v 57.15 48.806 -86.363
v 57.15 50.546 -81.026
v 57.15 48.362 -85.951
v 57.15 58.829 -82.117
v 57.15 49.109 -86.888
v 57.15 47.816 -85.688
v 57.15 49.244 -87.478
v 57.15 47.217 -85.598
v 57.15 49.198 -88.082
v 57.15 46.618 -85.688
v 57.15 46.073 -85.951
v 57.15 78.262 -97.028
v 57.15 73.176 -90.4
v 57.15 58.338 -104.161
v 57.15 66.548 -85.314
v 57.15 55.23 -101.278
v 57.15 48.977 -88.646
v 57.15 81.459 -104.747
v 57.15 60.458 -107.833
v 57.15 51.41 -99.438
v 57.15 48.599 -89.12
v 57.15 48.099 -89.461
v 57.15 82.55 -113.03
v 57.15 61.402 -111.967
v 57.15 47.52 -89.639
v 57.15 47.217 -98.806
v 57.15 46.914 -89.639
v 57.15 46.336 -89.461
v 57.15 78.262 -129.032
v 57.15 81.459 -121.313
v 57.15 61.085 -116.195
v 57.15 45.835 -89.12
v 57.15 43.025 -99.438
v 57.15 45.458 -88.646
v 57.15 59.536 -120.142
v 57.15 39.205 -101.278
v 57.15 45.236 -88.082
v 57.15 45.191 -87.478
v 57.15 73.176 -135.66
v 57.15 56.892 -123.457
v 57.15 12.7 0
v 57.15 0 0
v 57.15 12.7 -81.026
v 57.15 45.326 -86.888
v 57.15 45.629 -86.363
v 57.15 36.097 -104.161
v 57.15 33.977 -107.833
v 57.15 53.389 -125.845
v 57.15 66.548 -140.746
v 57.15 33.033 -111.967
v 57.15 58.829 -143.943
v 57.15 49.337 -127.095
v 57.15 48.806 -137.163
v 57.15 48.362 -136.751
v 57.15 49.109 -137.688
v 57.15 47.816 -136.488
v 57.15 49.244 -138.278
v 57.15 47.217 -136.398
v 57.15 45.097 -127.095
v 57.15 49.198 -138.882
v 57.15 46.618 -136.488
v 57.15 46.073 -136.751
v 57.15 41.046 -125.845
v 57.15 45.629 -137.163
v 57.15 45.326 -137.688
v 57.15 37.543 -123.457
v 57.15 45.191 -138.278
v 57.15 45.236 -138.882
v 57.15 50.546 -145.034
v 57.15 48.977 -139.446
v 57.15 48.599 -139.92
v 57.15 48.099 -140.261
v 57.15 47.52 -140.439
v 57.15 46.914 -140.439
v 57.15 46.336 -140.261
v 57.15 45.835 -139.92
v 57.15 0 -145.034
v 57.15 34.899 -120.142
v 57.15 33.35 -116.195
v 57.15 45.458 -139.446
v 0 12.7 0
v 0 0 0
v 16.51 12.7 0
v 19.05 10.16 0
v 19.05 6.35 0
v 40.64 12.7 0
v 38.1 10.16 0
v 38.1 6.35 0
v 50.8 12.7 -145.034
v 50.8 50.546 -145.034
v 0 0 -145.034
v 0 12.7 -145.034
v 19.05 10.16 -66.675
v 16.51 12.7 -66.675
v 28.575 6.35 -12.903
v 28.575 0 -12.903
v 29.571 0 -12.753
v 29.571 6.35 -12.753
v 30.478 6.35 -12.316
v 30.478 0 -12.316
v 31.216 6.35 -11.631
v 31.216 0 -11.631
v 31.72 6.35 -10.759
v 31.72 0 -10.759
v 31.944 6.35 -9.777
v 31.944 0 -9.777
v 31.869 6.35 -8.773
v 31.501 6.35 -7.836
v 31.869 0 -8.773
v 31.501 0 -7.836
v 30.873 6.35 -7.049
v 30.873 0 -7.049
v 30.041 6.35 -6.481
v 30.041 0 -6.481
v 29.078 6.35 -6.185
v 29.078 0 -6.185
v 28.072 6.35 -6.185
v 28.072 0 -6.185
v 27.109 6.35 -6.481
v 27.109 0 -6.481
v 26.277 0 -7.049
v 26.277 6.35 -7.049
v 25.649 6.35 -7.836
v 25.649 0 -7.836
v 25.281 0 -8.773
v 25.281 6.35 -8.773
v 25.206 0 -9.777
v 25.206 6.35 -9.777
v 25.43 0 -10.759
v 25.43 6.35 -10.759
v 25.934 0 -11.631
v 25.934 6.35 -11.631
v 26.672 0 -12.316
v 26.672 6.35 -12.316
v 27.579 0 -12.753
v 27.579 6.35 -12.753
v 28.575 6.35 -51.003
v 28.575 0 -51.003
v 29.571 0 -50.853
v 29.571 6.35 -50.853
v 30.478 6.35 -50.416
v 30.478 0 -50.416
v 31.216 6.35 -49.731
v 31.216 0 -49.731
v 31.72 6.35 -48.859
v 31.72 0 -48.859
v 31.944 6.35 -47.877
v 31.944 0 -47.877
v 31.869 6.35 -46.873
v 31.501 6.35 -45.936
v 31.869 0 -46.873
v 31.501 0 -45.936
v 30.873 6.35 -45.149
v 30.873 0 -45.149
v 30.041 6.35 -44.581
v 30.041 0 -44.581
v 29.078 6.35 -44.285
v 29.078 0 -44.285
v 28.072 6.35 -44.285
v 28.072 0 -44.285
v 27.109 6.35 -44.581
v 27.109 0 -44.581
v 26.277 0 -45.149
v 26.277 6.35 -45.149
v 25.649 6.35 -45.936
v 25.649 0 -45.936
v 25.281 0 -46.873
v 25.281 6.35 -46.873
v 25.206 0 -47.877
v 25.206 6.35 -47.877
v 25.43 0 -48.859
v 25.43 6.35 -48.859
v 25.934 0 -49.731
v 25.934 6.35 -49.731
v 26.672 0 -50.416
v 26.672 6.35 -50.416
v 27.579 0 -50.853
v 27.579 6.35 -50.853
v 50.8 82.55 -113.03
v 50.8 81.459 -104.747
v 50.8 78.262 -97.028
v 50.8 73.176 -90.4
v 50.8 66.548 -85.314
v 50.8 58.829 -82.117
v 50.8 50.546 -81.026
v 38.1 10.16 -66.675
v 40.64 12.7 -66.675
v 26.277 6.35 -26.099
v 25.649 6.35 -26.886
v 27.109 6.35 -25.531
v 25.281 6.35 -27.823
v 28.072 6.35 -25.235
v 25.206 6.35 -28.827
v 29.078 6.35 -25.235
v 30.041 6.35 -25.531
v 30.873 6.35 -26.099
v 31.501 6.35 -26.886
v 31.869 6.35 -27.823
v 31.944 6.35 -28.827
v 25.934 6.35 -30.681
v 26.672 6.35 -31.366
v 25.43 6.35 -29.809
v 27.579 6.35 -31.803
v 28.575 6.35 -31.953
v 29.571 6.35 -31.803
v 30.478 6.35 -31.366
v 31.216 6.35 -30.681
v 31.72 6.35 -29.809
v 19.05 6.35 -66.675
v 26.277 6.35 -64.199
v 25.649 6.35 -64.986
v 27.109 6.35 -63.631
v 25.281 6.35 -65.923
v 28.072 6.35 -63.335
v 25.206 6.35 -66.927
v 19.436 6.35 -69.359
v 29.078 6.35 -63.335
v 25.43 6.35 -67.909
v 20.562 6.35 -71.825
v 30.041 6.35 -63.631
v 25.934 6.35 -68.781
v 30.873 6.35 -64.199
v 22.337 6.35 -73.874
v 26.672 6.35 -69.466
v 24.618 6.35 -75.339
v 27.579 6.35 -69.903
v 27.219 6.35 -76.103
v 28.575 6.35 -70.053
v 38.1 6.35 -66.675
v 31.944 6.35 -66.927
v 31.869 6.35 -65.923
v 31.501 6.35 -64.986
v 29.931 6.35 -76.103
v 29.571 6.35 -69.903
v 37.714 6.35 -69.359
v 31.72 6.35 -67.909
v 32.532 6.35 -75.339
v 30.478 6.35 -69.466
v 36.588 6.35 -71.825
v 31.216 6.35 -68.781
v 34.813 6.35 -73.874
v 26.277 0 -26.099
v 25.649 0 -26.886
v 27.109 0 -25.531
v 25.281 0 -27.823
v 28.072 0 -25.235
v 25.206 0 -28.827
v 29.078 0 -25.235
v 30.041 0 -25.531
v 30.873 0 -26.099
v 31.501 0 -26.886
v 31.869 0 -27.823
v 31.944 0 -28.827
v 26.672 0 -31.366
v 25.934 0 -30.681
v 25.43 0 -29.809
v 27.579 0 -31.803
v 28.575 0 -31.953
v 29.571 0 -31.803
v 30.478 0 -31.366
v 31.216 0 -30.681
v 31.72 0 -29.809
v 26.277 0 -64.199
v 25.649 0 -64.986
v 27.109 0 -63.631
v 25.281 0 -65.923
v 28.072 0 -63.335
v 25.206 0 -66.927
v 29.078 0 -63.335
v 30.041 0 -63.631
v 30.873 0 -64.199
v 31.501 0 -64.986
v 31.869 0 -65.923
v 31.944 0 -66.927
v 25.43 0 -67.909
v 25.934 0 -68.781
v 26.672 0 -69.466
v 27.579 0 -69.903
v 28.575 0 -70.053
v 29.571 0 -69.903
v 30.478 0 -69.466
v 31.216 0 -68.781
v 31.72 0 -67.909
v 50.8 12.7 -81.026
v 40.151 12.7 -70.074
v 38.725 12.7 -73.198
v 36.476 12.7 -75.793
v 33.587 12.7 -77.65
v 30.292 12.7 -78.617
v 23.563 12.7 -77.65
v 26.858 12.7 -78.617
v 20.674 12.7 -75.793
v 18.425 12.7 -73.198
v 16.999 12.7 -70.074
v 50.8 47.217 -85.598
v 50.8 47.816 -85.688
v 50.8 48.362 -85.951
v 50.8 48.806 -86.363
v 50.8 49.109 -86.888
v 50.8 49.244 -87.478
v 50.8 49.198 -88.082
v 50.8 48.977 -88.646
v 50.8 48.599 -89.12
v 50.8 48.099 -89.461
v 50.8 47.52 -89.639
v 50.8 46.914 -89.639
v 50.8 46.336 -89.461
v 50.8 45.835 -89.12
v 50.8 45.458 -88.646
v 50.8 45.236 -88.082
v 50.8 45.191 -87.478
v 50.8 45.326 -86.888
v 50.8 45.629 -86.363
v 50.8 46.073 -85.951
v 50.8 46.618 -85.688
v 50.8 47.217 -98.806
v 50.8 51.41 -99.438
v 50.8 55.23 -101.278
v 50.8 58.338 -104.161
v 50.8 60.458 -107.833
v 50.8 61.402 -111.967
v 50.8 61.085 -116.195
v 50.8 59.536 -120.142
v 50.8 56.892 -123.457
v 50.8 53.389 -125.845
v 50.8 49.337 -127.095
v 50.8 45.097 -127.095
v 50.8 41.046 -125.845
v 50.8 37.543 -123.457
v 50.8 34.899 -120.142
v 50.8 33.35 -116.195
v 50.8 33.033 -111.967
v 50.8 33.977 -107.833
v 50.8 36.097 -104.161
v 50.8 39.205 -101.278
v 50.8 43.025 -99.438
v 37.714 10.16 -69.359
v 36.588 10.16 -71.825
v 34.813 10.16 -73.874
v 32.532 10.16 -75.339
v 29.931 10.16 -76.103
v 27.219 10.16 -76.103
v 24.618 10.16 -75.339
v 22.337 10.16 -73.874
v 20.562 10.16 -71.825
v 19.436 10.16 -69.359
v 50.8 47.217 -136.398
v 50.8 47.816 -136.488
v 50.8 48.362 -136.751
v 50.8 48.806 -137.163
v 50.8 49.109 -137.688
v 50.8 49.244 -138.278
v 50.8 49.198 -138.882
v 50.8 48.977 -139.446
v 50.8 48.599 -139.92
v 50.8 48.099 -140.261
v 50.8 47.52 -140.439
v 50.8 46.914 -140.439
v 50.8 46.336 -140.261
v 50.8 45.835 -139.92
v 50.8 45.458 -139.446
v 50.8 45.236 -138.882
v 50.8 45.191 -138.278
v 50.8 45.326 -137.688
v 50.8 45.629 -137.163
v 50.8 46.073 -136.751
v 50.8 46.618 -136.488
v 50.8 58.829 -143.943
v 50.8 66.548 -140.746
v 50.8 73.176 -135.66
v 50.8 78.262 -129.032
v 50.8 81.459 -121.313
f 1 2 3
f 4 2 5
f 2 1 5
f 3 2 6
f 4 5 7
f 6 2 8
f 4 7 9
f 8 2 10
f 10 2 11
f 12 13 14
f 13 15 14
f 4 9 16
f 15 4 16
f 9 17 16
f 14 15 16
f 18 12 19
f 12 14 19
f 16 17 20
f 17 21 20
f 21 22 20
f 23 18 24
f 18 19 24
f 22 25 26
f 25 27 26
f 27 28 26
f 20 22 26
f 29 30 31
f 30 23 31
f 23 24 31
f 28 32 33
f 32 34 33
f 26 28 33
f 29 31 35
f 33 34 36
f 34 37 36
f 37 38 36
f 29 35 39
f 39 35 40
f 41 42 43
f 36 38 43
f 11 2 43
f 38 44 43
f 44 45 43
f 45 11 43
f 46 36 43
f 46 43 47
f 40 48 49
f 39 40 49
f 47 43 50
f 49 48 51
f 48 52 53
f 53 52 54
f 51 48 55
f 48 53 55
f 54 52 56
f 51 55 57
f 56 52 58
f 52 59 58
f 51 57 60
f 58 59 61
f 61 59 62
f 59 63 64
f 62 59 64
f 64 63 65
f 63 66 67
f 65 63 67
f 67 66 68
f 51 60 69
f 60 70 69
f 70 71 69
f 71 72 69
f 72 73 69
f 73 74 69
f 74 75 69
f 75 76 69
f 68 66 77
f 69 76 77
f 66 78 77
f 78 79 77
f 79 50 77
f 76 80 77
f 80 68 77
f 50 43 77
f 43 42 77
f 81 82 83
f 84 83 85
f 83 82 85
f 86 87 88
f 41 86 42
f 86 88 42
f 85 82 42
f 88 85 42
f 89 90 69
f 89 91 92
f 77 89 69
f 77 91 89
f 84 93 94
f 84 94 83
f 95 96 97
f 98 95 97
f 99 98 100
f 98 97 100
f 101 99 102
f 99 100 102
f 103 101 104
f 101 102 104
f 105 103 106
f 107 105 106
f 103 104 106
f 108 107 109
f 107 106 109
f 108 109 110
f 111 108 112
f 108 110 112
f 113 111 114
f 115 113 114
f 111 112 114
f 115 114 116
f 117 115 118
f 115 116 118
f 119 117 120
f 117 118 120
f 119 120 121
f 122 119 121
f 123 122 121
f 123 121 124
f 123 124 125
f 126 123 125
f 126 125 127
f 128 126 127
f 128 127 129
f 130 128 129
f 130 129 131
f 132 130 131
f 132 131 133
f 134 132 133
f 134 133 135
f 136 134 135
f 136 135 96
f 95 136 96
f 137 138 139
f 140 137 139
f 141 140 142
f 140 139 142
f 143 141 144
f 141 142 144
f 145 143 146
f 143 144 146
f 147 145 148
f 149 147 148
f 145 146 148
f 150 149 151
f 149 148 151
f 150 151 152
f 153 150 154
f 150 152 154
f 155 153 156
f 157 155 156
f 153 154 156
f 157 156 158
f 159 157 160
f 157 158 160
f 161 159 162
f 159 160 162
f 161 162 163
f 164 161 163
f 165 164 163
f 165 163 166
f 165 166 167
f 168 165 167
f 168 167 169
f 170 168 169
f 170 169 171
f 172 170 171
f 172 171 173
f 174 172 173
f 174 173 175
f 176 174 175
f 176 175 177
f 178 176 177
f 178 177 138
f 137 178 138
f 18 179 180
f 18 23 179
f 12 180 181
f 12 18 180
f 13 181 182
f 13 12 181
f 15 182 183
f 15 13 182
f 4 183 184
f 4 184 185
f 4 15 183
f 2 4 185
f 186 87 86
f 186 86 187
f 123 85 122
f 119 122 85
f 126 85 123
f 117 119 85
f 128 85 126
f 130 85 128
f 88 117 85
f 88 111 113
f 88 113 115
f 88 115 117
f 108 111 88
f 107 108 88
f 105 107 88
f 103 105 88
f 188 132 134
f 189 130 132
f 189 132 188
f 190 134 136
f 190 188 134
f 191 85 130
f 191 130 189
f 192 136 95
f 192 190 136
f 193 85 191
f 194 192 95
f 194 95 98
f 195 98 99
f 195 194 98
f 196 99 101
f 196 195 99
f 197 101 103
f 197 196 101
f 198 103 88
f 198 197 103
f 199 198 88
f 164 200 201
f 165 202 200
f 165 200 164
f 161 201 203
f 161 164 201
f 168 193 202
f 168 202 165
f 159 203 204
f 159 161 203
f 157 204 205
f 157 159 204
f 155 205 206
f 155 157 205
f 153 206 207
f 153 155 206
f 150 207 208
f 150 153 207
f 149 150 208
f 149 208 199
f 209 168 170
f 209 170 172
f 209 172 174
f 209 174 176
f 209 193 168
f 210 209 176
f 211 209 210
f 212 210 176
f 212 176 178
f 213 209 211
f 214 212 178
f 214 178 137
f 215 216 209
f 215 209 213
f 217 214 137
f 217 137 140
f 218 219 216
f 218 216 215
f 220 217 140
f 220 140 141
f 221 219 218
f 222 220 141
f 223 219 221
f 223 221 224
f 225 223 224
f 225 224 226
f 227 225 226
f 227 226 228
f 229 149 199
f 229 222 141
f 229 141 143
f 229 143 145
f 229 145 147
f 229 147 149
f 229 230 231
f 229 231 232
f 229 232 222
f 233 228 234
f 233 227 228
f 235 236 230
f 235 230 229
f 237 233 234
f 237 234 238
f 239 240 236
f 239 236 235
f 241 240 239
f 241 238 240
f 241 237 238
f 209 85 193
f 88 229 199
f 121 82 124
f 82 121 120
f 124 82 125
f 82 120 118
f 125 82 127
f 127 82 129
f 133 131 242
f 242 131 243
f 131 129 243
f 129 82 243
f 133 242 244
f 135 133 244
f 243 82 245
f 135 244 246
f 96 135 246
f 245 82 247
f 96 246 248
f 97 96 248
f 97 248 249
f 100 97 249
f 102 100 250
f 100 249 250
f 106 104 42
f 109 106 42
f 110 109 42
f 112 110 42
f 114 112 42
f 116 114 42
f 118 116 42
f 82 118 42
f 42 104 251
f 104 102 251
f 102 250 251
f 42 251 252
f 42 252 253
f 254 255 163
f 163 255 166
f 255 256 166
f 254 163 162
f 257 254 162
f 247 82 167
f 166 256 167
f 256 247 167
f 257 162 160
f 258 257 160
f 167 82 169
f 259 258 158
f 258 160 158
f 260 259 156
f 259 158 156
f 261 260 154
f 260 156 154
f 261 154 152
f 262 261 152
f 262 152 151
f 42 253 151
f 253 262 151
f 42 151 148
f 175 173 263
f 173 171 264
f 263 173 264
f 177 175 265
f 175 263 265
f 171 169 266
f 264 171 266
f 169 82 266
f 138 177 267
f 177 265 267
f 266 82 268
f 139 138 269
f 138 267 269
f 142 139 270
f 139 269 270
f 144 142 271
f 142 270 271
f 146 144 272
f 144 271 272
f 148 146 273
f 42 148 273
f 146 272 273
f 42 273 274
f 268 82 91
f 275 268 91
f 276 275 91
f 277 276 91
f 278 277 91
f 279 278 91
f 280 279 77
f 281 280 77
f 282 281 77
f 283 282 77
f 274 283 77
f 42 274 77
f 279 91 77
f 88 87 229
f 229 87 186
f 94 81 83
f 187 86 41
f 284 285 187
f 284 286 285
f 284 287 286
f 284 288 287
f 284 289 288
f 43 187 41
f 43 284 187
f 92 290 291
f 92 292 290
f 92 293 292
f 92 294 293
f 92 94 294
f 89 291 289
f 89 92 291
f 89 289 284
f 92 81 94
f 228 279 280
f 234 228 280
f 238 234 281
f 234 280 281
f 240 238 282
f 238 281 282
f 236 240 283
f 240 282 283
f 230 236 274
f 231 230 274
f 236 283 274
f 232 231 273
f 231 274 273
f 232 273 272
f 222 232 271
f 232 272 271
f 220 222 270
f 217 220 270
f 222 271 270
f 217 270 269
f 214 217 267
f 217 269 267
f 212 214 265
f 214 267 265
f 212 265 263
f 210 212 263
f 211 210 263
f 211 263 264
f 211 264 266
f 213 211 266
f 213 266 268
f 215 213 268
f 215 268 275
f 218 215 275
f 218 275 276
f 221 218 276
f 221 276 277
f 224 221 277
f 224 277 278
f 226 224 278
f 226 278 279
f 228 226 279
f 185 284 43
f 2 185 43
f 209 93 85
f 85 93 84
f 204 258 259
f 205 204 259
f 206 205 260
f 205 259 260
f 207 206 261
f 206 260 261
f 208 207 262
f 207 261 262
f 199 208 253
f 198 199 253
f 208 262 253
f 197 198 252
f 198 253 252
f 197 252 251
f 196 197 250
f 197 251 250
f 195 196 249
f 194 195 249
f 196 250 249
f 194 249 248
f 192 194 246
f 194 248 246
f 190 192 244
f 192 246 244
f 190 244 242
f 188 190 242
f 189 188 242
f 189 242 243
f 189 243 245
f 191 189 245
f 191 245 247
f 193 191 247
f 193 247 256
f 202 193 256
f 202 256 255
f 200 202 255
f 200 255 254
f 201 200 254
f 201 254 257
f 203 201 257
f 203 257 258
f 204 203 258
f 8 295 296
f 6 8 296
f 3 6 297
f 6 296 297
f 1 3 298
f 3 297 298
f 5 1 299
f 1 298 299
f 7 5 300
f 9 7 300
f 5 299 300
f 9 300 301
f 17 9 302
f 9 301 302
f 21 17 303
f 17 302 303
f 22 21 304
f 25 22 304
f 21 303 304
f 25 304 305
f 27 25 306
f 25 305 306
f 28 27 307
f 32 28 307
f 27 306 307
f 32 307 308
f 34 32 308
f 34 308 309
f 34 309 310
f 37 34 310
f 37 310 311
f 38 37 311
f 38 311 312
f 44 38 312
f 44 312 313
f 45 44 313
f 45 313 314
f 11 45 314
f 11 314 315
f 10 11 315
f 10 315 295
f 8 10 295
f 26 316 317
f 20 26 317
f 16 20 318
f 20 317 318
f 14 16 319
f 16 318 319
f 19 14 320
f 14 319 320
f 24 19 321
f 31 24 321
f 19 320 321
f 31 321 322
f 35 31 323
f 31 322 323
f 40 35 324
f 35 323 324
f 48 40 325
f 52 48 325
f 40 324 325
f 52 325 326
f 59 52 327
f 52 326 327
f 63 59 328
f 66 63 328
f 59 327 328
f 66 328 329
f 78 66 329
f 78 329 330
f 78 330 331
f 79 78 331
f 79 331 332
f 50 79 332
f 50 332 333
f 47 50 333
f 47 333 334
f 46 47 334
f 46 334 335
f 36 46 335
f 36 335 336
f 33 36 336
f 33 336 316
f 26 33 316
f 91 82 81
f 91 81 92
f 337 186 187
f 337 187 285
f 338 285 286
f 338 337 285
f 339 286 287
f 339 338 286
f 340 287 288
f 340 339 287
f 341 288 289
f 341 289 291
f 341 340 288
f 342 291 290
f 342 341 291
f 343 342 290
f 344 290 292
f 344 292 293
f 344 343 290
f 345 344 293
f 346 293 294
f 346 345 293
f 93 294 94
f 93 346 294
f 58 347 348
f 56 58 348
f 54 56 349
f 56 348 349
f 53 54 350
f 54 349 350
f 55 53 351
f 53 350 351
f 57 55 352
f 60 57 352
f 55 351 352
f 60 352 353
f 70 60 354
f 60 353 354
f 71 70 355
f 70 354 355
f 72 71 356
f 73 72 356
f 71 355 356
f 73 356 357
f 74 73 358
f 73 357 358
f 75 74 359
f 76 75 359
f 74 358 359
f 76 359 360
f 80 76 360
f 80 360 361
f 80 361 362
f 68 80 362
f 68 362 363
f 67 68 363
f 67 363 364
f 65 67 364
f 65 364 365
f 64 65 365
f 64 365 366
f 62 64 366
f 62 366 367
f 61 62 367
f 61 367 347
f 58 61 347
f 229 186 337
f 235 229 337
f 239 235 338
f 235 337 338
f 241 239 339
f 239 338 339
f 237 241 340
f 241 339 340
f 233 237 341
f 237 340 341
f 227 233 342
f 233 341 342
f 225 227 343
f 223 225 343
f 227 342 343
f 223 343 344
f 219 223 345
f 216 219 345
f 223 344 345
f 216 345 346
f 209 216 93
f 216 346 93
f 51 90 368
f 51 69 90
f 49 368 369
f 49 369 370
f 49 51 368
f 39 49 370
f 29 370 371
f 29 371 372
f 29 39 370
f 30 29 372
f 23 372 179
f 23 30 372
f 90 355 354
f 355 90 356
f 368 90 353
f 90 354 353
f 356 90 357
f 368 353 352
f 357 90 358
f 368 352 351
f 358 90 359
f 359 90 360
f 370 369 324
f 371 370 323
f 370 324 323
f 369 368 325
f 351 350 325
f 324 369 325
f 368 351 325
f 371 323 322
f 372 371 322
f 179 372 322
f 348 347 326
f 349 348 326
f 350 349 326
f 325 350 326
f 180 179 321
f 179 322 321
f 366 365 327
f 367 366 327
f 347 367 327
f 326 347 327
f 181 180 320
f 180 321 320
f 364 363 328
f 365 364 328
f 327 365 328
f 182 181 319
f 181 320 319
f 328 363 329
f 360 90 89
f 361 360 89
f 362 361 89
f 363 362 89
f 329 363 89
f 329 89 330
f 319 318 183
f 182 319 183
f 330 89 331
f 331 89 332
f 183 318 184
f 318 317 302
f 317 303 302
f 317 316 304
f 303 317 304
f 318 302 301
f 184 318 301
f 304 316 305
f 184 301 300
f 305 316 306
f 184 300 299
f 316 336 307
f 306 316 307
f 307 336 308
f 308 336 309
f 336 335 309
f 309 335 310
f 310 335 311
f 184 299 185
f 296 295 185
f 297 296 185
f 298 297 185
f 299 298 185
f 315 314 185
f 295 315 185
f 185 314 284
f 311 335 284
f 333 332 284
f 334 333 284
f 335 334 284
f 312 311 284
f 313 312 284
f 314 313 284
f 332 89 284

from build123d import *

# Parameters (mm, degrees)
SKETCH1_W           = 57.15
SKETCH1_H           = 145.034
BOSS_EXTRUDE1_DEPTH = 12.7
SKETCH4_R           = 3.3782
CUT_EXTRUDE3_DEPTH  = 157.404199611
CUT_EXTRUDE4_DEPTH  = 6.35
CHAMFER1_SIZE       = 2.54
SKETCH7_W           = 6.35
SKETCH7_H           = 64.008
BOSS_EXTRUDE2_DEPTH = 82.55
SKETCH9_R           = 14.224
SKETCH9_R_2         = 2.032
CUT_EXTRUDE5_DEPTH  = 82.55
FILLET1_R           = 32.004


with BuildPart() as part:
    # Sketch1 → Boss-Extrude1 (new body)
    with BuildSketch(Plane(origin=(0, 0, 0), x_dir=(1, 0, 0), z_dir=(0, 1, 0))):
        with Locations((28.575, 72.517)):
            Rectangle(SKETCH1_W, SKETCH1_H)
    extrude(amount=BOSS_EXTRUDE1_DEPTH)

    # Sketch4 → Cut-Extrude3 (cut, through all)
    with BuildSketch(Plane(origin=(0, 0, 0), x_dir=(-1, 0, 0), z_dir=(0, -1, 0))):
        with Locations(Location((-28.575, 9.525, 0), (0, 0, 90))):
            Circle(SKETCH4_R)
        with Locations(Location((-28.575, 28.575, 0), (0, 0, 90))):
            Circle(SKETCH4_R)
        with Locations(Location((-28.575, 47.625, 0), (0, 0, 90))):
            Circle(SKETCH4_R)
        with Locations(Location((-28.575, 66.675, 0), (0, 0, 90))):
            Circle(SKETCH4_R)
    extrude(amount=-CUT_EXTRUDE3_DEPTH, mode=Mode.SUBTRACT)

    # Sketch8 → Cut-Extrude4 (cut)
    with BuildSketch(Plane(origin=(0, 12.7, 0), x_dir=(1, 0, 0), z_dir=(0, 1, 0))):
        with BuildLine():
            Line((19.05, 66.675), (19.05, 0))
            Line((19.05, 0), (38.1, 0))
            Line((38.1, 0), (38.1, 66.675))
            ThreePointArc((38.1, 66.675), (28.575, 76.2), (19.05, 66.675))
        make_face()
    extrude(amount=-CUT_EXTRUDE4_DEPTH, mode=Mode.SUBTRACT)

    # Chamfer1
    chamfer1_edges = [part.edges().sort_by_distance(p)[0] for p in [
        (28.575, 12.7, -76.2),
        (19.05, 12.7, -33.3375),
        (38.1, 12.7, -33.3375),
    ]]
    chamfer(chamfer1_edges, length=CHAMFER1_SIZE)

    # Sketch7 → Boss-Extrude2 (add)
    with BuildSketch(Plane.XZ):
        with Locations((53.975, -113.03)):
            Rectangle(SKETCH7_W, SKETCH7_H)
    extrude(amount=-BOSS_EXTRUDE2_DEPTH)

    # Sketch9 → Cut-Extrude5 (cut)
    with BuildSketch(Plane.ZY.offset(-50.8)):
        with Locations((-113.03, 47.217289291)):
            Circle(SKETCH9_R)
        with Locations((-87.63, 47.217289291)):
            Circle(SKETCH9_R_2)
        with Locations((-138.43, 47.217289291)):
            Circle(SKETCH9_R_2)
    extrude(amount=-CUT_EXTRUDE5_DEPTH, mode=Mode.SUBTRACT)

    # Fillet1
    fillet1_edges = [part.edges().sort_by_distance(p)[0] for p in [
        (53.975, 82.55, -81.026),
        (53.975, 82.55, -145.034),
    ]]
    fillet(fillet1_edges, radius=FILLET1_R - 0.0001)  # a hair under: the kernel refuses the full size


solid = part.part
